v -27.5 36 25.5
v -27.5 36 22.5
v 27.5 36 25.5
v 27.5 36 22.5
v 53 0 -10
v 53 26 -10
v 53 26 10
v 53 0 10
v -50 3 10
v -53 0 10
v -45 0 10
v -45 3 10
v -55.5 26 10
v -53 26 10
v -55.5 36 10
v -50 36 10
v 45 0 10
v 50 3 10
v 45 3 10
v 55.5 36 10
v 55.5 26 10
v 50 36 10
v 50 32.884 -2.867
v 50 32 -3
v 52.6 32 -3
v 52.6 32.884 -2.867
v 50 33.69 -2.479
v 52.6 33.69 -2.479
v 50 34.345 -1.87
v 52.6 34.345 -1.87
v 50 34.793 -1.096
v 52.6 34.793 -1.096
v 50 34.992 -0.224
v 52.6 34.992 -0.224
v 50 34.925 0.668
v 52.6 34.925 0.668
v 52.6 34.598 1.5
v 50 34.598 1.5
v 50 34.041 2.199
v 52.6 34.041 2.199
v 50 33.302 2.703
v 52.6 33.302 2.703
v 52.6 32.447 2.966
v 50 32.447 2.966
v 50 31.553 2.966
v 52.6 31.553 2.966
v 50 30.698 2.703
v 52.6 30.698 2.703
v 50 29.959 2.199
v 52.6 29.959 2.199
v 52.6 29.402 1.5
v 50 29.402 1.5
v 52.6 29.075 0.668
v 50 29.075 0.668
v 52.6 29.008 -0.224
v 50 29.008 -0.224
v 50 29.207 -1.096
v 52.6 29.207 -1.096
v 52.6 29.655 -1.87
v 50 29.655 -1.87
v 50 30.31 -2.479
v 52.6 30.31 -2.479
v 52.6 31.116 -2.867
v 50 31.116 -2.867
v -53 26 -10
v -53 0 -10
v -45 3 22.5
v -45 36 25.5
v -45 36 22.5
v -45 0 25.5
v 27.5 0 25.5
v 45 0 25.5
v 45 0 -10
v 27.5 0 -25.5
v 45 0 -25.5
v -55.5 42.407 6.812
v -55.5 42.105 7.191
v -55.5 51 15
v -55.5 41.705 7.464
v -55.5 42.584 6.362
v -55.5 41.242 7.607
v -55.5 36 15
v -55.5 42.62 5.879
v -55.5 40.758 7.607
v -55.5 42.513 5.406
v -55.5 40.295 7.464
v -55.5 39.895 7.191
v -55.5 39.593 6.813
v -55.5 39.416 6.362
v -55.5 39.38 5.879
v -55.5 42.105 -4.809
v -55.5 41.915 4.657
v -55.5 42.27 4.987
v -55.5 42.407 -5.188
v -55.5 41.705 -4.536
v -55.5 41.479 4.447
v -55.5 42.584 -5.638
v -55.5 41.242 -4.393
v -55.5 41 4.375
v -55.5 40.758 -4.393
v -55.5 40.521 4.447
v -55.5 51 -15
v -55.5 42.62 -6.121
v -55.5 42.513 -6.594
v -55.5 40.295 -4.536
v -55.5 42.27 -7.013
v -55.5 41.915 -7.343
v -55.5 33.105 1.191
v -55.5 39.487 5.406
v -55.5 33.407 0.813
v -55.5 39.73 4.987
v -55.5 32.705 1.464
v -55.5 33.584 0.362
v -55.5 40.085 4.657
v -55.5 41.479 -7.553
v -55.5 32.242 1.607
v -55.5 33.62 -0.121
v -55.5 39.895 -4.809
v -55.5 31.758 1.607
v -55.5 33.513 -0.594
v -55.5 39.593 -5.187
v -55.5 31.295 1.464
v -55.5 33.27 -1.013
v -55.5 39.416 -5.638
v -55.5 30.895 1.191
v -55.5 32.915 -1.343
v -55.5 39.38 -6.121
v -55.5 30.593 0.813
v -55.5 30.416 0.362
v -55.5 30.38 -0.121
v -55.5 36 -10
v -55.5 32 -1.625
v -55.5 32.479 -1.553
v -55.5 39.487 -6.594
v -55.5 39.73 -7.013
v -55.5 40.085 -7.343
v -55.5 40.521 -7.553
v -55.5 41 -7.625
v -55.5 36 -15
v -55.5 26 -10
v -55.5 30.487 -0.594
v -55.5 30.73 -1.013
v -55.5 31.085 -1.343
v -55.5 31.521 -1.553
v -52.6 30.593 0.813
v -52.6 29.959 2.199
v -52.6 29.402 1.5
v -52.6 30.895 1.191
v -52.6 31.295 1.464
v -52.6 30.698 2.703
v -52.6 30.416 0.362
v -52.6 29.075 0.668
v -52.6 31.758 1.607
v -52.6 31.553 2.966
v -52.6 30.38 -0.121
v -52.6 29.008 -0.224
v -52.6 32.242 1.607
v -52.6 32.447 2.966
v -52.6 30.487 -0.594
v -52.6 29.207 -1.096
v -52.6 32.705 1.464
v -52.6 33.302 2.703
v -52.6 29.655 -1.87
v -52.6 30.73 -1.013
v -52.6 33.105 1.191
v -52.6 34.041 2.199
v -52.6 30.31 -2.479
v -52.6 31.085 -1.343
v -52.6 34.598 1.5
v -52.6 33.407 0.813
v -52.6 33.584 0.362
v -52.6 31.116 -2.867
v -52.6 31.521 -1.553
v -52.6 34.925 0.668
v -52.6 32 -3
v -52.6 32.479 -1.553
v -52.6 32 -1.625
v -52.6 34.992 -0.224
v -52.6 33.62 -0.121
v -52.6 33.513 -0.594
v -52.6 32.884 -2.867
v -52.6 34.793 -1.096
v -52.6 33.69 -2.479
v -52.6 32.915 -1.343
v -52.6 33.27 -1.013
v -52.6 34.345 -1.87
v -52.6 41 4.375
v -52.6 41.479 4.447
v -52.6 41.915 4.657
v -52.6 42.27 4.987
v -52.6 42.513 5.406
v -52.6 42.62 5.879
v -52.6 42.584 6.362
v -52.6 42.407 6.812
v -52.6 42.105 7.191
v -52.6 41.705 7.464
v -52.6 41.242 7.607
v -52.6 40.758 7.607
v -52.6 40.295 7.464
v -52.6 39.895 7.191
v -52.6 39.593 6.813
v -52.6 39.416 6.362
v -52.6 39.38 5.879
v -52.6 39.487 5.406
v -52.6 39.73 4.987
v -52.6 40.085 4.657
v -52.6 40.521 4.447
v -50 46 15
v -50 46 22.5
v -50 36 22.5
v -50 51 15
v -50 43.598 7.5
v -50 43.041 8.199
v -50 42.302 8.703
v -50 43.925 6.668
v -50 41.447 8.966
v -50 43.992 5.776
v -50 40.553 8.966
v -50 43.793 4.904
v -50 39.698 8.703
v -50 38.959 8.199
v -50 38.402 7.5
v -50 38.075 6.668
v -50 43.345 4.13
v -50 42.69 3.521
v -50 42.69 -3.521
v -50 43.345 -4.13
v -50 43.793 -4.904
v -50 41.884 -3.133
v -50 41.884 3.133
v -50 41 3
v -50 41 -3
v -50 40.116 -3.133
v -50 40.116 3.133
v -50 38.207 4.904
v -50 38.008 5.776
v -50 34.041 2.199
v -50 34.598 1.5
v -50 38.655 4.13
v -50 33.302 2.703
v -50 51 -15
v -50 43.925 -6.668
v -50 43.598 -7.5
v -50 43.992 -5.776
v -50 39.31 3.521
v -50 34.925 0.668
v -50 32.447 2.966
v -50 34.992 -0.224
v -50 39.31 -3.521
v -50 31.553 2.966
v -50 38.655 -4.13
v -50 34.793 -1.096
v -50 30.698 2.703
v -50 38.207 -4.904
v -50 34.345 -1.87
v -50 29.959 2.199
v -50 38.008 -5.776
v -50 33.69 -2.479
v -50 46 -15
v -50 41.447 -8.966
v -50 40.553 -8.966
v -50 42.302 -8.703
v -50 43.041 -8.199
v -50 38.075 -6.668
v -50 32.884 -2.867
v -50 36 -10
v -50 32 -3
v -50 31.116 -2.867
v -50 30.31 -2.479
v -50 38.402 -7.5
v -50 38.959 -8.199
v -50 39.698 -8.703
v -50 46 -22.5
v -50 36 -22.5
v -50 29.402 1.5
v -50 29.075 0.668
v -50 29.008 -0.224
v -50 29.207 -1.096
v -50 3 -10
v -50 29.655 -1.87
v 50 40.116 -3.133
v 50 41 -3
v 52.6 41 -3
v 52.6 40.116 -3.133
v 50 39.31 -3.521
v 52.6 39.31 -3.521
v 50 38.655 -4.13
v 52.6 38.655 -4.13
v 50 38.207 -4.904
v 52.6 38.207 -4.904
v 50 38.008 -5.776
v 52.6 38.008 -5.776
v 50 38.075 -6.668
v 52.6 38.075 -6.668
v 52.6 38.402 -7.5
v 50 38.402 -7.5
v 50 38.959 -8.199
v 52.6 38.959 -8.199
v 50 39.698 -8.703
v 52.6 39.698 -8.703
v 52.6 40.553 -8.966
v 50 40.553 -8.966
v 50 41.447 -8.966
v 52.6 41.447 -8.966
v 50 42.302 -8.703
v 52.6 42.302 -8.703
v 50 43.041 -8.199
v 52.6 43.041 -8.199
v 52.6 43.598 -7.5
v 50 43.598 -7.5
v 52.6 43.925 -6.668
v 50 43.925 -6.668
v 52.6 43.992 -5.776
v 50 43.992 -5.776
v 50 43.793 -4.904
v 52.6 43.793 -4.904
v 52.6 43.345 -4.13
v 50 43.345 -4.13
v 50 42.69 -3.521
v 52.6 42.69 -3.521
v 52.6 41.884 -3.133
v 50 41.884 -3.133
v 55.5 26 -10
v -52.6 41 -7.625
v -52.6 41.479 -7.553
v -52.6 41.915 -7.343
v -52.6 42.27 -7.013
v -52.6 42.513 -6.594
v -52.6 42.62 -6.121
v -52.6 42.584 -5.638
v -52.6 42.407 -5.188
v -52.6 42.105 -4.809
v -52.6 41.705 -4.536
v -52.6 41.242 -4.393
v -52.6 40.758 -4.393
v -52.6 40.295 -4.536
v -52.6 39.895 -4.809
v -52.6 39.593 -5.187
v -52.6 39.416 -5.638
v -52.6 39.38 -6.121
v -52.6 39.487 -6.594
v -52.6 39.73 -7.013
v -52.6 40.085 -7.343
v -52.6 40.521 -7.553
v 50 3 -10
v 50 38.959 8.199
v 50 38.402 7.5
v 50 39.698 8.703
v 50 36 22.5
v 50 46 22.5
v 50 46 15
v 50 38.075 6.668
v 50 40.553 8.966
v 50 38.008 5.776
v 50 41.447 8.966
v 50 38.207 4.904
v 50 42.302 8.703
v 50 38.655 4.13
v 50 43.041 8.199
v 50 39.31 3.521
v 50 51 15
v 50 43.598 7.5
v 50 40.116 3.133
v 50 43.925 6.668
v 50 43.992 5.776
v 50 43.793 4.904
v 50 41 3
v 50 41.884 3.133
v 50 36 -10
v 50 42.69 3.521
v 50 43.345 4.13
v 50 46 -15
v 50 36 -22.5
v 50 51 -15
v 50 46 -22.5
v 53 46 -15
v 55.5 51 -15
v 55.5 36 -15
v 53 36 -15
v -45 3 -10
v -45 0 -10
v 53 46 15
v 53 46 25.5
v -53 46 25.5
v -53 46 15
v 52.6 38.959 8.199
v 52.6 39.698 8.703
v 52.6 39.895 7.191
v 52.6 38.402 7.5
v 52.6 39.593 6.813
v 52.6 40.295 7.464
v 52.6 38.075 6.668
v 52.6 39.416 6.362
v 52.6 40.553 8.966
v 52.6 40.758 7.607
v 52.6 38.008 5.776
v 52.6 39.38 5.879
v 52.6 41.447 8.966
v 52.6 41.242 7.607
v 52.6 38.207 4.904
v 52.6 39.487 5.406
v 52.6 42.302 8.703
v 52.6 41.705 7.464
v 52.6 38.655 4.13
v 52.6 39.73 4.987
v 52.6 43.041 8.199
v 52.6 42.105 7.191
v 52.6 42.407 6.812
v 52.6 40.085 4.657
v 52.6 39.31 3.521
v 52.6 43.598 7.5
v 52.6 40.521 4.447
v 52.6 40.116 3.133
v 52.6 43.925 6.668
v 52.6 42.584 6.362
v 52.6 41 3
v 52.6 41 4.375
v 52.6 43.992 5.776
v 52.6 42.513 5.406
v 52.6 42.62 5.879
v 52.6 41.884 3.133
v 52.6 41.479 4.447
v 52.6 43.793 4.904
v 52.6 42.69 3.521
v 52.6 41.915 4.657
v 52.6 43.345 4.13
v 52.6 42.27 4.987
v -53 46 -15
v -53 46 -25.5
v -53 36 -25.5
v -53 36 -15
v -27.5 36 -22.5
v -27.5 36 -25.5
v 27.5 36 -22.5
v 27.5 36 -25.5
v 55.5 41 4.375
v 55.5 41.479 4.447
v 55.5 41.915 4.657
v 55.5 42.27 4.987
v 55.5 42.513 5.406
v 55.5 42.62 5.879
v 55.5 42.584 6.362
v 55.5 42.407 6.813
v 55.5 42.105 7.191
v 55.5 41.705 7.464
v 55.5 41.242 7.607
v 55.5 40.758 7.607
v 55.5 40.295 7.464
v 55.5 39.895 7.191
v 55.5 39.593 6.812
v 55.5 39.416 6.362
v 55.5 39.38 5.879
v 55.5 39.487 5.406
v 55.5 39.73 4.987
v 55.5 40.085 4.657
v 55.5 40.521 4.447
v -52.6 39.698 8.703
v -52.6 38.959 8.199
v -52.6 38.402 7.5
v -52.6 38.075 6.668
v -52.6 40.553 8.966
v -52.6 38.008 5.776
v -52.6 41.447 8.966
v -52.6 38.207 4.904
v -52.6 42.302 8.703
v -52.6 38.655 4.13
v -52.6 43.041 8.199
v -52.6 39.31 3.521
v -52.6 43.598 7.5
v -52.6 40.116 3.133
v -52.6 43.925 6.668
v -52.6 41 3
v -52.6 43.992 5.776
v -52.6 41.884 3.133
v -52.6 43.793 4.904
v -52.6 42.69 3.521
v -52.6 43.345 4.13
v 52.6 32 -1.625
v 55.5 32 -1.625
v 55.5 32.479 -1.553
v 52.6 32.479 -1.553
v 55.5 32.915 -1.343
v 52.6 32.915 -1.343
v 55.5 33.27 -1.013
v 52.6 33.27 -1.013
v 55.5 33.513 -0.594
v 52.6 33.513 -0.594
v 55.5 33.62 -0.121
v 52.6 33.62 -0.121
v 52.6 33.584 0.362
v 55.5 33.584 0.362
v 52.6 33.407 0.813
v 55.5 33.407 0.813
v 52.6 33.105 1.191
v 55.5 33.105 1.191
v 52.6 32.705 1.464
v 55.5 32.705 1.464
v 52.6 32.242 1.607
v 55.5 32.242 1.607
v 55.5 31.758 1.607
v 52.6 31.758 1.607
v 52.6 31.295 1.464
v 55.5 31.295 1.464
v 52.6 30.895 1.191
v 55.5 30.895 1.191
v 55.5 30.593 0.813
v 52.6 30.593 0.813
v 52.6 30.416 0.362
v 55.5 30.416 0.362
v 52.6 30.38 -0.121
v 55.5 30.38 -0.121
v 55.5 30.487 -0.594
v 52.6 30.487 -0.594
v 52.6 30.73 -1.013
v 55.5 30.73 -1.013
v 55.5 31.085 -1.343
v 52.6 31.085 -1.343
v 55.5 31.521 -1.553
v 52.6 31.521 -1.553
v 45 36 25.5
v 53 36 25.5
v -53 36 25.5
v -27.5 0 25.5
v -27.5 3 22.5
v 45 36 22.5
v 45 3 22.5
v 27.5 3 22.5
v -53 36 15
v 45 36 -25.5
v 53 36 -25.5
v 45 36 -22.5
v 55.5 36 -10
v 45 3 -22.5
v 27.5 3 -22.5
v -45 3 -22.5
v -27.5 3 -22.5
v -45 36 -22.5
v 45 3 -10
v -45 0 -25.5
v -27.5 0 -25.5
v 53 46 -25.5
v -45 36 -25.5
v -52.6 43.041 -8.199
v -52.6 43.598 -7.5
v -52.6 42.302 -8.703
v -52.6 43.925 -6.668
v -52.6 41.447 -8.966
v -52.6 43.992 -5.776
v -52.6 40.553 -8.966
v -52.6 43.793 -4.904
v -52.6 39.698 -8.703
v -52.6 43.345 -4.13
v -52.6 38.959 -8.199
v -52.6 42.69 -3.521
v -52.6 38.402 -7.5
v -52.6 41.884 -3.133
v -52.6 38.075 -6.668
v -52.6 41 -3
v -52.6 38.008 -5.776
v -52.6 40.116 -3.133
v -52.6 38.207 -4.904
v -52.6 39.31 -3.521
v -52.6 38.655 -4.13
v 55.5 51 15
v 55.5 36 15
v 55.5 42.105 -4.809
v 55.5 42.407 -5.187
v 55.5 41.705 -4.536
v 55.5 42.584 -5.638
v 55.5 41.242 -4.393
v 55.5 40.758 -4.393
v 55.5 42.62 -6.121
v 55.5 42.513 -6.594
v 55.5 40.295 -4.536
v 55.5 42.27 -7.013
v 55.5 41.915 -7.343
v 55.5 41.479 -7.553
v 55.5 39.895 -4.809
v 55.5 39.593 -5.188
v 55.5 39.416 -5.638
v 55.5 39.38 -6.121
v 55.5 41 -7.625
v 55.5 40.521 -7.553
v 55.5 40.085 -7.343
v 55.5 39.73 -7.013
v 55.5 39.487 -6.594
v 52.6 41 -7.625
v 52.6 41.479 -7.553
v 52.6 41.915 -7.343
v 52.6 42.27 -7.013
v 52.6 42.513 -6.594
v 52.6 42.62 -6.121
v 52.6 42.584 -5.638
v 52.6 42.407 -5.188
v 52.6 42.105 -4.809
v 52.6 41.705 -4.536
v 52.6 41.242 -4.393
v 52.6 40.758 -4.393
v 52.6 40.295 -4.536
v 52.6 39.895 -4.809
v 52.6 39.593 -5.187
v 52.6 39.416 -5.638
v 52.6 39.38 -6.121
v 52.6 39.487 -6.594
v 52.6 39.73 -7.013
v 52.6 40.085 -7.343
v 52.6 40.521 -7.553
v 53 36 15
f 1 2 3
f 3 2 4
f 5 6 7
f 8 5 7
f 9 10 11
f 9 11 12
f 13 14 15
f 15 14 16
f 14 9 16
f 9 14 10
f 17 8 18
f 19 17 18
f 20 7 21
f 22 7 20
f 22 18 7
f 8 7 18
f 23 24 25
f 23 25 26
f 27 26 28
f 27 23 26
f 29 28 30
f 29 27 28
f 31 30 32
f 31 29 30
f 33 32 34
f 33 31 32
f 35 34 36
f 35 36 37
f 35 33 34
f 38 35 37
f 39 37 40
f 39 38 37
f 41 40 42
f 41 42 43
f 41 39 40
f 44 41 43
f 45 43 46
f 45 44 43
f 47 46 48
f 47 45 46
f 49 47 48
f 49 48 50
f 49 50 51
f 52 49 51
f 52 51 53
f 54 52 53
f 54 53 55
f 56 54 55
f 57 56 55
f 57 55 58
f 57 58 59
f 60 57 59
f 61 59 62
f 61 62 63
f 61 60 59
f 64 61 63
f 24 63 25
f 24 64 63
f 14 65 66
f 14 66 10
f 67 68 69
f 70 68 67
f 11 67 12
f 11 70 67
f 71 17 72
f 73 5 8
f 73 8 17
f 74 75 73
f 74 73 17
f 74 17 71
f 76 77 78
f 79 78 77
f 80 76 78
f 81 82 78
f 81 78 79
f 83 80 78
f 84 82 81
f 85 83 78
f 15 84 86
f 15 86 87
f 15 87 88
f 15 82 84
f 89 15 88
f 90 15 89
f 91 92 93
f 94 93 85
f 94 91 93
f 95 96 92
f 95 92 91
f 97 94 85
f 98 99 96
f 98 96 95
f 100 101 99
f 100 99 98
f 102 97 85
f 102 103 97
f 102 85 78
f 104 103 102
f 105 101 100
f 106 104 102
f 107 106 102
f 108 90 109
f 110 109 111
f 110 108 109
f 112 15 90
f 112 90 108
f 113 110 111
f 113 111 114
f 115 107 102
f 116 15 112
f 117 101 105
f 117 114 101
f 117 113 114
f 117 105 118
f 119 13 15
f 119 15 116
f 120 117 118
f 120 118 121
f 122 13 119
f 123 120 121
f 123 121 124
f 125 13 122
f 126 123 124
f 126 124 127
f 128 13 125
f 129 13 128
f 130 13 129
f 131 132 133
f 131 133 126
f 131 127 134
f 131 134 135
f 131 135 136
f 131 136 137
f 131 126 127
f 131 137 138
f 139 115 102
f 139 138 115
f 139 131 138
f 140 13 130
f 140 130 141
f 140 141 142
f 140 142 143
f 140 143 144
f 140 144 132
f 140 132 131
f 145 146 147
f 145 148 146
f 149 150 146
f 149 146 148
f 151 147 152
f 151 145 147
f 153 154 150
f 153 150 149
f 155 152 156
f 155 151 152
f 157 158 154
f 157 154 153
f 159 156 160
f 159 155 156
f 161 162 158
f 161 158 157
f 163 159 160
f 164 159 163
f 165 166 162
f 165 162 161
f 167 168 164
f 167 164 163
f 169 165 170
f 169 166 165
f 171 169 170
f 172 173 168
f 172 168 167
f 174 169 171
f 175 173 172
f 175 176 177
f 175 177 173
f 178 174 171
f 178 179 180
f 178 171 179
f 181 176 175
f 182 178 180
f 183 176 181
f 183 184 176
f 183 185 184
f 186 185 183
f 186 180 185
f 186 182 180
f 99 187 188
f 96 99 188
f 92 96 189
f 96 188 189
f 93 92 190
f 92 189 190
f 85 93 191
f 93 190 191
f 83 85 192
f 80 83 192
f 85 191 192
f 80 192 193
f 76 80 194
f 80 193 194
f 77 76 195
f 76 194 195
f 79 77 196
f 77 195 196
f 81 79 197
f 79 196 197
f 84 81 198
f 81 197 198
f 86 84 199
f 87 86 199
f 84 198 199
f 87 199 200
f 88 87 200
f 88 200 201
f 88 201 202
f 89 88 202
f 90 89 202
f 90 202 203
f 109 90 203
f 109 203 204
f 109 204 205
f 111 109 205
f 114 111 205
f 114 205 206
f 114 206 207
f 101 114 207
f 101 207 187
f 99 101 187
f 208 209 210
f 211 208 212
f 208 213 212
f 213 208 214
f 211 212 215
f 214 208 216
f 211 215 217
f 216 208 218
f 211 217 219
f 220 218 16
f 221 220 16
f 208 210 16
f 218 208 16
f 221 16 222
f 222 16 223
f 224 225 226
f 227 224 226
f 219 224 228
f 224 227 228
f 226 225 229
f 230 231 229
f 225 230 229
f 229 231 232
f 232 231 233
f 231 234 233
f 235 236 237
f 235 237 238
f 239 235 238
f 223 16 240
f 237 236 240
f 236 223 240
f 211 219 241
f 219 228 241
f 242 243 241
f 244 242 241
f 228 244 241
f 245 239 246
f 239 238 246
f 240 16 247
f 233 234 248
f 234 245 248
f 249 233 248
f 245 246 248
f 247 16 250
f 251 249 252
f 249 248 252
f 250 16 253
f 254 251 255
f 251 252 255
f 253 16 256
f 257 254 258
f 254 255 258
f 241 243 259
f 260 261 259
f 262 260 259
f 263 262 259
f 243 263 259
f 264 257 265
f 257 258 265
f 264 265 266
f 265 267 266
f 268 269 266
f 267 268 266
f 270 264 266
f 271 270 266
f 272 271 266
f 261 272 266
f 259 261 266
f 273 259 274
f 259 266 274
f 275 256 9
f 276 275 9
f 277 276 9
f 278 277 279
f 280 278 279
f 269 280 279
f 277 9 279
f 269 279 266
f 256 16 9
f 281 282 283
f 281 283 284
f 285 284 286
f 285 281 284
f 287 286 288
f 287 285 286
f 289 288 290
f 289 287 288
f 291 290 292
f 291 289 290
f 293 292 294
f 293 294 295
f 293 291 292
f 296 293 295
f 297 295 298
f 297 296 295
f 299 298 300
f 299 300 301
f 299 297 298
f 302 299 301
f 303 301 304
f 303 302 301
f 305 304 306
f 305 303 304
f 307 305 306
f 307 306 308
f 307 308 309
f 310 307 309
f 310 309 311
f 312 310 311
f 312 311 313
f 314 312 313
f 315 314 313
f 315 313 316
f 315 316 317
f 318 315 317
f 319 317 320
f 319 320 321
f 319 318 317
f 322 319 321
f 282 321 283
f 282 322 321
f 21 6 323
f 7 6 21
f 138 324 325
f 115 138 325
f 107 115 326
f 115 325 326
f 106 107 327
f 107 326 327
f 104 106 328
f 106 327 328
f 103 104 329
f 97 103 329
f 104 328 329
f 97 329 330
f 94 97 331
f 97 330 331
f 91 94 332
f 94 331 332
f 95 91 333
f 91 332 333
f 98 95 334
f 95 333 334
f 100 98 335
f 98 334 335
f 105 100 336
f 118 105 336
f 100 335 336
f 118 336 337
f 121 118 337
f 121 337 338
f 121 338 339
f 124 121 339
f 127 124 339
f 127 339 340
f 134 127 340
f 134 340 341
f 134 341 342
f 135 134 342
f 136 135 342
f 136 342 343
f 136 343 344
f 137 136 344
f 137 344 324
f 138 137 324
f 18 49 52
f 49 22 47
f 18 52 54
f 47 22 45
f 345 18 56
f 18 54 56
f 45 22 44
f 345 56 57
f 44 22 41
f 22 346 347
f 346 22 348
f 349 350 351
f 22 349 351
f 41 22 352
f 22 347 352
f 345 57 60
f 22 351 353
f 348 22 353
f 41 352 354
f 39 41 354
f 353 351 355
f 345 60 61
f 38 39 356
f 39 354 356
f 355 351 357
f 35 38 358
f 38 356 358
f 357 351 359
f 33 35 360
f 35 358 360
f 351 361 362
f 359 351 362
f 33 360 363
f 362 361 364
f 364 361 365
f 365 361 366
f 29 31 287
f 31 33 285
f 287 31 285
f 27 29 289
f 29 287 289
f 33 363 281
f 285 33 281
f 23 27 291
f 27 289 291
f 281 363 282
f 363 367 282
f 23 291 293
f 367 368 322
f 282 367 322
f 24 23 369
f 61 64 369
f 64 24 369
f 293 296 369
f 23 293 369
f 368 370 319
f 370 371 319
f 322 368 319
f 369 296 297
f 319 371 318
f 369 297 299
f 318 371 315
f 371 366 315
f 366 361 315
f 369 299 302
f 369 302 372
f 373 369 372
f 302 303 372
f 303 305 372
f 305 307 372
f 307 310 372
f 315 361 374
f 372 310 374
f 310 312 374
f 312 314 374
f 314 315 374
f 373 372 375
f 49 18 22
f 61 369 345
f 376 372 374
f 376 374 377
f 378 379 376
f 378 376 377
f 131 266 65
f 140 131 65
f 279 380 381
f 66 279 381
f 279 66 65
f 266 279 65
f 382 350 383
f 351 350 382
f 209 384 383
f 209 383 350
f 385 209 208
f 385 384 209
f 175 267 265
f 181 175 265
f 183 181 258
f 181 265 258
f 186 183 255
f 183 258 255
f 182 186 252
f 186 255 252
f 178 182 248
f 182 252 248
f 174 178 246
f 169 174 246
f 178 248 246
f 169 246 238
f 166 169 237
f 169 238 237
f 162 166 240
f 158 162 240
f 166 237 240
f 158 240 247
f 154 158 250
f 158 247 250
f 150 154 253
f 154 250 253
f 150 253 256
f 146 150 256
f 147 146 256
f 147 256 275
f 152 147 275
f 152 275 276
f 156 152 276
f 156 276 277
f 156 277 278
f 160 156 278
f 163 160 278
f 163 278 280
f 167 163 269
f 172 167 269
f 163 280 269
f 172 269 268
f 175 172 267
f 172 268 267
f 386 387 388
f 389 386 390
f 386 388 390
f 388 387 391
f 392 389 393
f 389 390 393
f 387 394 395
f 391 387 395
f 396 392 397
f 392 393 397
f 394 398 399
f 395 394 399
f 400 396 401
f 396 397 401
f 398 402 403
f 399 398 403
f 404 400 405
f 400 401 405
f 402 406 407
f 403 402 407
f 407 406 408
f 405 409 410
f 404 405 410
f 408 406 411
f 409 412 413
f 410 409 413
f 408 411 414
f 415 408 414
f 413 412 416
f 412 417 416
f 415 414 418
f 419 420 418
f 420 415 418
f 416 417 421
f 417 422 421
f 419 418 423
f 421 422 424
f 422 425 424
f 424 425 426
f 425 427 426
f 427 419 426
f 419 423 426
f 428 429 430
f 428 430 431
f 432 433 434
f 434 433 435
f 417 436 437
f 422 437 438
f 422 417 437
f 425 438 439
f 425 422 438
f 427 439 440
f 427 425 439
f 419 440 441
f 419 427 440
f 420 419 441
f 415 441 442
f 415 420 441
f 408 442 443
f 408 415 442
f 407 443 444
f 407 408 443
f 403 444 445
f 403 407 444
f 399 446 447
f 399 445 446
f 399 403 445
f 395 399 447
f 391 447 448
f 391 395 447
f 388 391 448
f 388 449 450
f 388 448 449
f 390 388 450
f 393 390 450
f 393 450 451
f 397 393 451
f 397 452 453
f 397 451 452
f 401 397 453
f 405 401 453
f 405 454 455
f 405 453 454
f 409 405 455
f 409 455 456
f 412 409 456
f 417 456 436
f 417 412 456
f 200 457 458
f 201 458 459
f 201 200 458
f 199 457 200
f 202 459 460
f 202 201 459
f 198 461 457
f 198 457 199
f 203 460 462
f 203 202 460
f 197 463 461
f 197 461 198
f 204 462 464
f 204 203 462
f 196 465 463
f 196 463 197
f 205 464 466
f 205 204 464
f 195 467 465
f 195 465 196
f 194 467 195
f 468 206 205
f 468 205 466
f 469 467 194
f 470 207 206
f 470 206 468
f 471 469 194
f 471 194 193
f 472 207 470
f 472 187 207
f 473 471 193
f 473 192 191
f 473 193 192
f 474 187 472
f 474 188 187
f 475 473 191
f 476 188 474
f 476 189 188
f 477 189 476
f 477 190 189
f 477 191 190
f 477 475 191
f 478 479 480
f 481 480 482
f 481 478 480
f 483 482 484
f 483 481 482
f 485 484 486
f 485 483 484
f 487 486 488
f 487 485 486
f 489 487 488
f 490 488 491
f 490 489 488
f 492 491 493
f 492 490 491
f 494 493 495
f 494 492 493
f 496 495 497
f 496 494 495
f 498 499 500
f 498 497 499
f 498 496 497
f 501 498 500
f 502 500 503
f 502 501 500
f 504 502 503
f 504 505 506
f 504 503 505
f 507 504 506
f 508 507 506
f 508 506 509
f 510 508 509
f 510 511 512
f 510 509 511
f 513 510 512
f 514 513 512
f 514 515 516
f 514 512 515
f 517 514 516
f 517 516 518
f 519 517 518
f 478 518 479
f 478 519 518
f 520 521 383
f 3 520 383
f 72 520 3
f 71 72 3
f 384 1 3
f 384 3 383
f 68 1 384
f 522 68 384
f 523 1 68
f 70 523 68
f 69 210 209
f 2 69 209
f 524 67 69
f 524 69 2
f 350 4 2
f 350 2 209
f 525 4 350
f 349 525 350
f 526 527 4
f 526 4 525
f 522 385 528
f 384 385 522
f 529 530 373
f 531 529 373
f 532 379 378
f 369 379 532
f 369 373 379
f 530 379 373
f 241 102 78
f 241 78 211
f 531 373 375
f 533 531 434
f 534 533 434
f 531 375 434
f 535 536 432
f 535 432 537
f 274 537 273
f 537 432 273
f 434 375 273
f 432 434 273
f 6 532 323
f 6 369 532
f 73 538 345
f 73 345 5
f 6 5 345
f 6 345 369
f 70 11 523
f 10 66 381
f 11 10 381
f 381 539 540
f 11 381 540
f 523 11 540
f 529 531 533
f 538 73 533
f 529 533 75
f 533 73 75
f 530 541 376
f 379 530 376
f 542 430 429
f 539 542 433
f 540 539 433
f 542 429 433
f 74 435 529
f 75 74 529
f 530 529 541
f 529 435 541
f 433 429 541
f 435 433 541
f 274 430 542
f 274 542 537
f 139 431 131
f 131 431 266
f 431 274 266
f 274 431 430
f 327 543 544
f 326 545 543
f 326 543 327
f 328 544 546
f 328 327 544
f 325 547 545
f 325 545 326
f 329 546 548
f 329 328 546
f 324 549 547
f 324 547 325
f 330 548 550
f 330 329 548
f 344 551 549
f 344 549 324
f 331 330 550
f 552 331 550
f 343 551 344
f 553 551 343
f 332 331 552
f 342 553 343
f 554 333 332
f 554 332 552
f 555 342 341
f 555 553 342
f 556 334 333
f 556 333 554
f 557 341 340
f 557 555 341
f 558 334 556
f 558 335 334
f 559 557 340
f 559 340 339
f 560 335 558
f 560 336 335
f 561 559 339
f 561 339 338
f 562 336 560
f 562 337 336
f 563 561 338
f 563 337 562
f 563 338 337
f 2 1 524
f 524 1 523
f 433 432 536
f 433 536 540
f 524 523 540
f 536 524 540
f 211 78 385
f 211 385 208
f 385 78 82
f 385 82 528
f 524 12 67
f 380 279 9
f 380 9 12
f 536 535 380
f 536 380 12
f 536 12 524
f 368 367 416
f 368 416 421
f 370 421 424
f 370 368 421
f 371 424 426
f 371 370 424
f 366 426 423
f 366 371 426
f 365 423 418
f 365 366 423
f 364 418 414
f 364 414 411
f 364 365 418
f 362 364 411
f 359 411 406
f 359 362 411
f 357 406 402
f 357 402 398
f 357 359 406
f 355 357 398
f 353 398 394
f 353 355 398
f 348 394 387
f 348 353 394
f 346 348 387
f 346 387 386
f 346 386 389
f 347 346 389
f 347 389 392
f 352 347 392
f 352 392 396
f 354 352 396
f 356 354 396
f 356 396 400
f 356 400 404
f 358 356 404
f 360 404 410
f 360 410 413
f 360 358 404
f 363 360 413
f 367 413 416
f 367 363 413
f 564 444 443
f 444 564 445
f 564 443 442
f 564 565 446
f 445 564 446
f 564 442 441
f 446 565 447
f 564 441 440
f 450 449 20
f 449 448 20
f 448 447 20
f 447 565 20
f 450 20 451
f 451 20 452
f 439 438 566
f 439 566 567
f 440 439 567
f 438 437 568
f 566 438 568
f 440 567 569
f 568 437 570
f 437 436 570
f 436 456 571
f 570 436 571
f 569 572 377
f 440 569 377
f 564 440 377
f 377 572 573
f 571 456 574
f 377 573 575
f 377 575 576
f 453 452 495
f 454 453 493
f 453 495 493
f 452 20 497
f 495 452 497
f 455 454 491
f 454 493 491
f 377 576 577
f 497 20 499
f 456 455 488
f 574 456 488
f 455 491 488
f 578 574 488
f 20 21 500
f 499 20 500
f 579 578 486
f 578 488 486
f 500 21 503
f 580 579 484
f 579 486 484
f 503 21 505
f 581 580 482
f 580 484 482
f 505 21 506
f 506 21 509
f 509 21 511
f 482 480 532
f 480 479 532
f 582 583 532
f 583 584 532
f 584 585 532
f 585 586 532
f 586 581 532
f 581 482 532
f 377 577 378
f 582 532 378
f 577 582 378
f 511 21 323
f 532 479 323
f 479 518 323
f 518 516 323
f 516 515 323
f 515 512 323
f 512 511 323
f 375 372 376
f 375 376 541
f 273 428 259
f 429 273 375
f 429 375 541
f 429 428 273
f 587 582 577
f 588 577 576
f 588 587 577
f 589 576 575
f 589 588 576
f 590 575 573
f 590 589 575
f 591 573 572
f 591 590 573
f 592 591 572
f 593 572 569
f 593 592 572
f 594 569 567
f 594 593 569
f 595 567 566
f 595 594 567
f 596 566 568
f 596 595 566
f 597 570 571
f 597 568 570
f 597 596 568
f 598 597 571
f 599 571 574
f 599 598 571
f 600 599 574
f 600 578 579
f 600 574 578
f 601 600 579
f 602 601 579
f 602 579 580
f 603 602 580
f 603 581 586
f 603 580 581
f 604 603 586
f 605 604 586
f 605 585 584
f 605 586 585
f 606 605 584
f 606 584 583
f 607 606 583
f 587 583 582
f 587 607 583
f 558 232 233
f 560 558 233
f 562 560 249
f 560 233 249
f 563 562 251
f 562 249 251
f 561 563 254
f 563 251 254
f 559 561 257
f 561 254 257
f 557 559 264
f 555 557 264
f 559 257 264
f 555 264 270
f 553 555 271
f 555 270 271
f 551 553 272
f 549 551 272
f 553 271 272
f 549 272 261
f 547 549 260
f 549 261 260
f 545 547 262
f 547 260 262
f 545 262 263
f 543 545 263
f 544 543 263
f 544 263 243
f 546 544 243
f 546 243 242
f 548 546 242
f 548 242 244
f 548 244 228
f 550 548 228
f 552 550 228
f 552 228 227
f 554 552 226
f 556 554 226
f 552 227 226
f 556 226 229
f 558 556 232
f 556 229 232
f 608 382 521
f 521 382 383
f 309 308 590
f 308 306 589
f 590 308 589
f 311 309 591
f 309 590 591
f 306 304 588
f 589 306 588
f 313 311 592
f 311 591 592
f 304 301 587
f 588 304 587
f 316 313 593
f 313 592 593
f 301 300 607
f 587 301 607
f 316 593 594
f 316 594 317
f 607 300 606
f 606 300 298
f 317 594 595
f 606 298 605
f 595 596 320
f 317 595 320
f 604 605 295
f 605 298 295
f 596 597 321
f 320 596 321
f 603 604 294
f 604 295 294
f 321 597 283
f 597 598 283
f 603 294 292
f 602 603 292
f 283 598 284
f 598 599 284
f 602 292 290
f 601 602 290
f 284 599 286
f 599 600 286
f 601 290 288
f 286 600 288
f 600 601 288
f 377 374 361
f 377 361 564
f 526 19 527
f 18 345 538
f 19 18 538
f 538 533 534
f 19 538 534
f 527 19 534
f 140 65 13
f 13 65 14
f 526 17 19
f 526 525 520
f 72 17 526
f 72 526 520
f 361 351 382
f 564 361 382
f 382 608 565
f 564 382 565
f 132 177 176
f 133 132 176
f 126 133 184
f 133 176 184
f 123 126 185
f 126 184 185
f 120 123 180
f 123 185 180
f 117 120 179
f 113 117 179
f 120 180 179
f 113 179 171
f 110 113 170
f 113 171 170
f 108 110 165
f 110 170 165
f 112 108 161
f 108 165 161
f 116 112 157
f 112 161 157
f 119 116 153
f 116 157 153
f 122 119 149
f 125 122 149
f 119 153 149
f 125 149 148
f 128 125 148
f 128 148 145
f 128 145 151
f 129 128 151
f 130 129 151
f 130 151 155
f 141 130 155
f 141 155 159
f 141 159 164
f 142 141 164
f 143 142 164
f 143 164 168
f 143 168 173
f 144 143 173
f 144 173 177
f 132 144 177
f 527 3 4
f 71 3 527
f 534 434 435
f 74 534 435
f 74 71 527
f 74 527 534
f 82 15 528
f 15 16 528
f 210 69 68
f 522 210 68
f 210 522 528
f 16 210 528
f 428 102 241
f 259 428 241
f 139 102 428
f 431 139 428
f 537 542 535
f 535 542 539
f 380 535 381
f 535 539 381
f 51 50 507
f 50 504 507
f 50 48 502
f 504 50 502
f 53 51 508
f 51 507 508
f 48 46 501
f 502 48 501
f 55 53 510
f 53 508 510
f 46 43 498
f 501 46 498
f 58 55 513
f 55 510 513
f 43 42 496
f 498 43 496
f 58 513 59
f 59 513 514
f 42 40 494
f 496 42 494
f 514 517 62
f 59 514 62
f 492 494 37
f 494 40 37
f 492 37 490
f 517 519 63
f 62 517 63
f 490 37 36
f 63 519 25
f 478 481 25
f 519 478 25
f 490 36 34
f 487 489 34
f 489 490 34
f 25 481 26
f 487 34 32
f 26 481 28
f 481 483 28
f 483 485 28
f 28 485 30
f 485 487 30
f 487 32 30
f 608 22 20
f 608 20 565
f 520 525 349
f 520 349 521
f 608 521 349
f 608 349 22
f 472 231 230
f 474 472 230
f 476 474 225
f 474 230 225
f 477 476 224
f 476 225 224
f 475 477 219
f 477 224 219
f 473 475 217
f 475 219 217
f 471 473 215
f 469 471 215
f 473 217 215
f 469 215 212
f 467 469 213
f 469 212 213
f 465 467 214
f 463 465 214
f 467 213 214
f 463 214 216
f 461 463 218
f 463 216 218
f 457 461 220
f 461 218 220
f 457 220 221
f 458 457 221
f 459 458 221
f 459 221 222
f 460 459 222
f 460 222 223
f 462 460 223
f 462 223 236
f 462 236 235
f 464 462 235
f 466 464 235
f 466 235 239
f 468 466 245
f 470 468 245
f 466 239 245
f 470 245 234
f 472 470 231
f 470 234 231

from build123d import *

# Parameters (mm, degrees)
EXTRUDE_1_DEPTH     = 3
EXTRUDE_1_2_DEPTH   = 3
SKETCH_2_W          = 17.5
SKETCH_2_H          = 3
SKETCH_2_W_2        = 3
SKETCH_2_H_2        = 20
EXTRUDE_2_DEPTH     = 43
SKETCH_3_W          = 55
SKETCH_3_H          = 3
EXTRUDE_3_DEPTH     = 10
EXTRUDE_4_DEPTH     = 2.5
SKETCH_5_R          = 3
CUT_EXTRUDE_1_DEPTH = 2.6
SKETCH_7_R          = 1.625
CUT_EXTRUDE_2_DEPTH = 118.972920622
SKETCH_8_W          = 5.5
SKETCH_8_H          = 30
EXTRUDE_5_DEPTH     = 5


with BuildPart() as part:
    # Эскиз1 → Бобышка-Вытянуть1 (new body)
    with BuildSketch(Plane(origin=(0, 0, 0), x_dir=(1, 0, 0), z_dir=(0, 1, 0))):
        Polygon((27.5, 25.5), (45, 25.5), (45, 10), (53, 10), (53, -10), (45, -10), (45, -25.5), (27.5, -25.5), align=None)
    extrude(amount=EXTRUDE_1_DEPTH)



with BuildPart() as body_2:
    # Эскиз1 → Extrude 1 2 (new body)
    with BuildSketch(Plane(origin=(0, 0, 0), x_dir=(1, 0, 0), z_dir=(0, 1, 0))):
        Polygon((-27.5, -25.5), (-27.5, 25.5), (-45, 25.5), (-45, 10), (-53, 10), (-53, -10), (-45, -10), (-45, -25.5), align=None)
    extrude(amount=EXTRUDE_1_2_DEPTH)


with BuildPart() as part_1:
    add(part.part)

    add(body_2.part)  # Бобышка-Вытянуть2 merges body 2
    # Эскиз2 → Бобышка-Вытянуть2 (add)
    with BuildSketch(Plane(origin=(0, 3, 0), x_dir=(1, 0, 0), z_dir=(0, 1, 0))):
        with Locations((36.25, 24)):
            Rectangle(SKETCH_2_W, SKETCH_2_H)
        with Locations((51.5, 0)):
            Rectangle(SKETCH_2_W_2, SKETCH_2_H_2)
        with Locations((36.25, -24)):
            Rectangle(SKETCH_2_W, SKETCH_2_H)
        with Locations((-36.25, -24)):
            Rectangle(SKETCH_2_W, SKETCH_2_H)
        with Locations((-51.5, 0)):
            Rectangle(SKETCH_2_W_2, SKETCH_2_H_2)
        with Locations((-36.25, 24)):
            Rectangle(SKETCH_2_W, SKETCH_2_H)
    extrude(amount=EXTRUDE_2_DEPTH)

    # Эскиз3 → Бобышка-Вытянуть3 (add)
    with BuildSketch(Plane(origin=(0, 46, 0), x_dir=(1, 0, 0), z_dir=(0, 1, 0))):
        Polygon((45, 25.5), (53, 25.5), (53, 10), (50, 10), (50, 22.5), (45, 22.5), align=None)
        with Locations((0, 24)):
            Rectangle(SKETCH_3_W, SKETCH_3_H)
        Polygon((-45, 22.5), (-45, 25.5), (-53, 25.5), (-53, 10), (-50, 10), (-50, 22.5), align=None)
        Polygon((-45, -25.5), (-53, -25.5), (-53, -10), (-50, -10), (-50, -22.5), (-45, -22.5), align=None)
        Polygon((45, -22.5), (45, -25.5), (53, -25.5), (53, -10), (50, -10), (50, -22.5), align=None)
        with Locations((0, -24)):
            Rectangle(SKETCH_3_W, SKETCH_3_H)
    extrude(amount=-EXTRUDE_3_DEPTH)

    # Эскиз4 → Бобышка-Вытянуть4 (add)
    with BuildSketch(Plane.ZY.offset(53)):
        Polygon((-10, 26), (10, 26), (10, 36), (15, 36), (15, 46), (-15, 46), (-15, 36), (-10, 36), align=None)
    extrude_4 = extrude(amount=EXTRUDE_4_DEPTH)

    # Эскиз5 → Вырез-Вытянуть1 (cut)
    with BuildSketch(Plane(origin=(-50, 0, 0), x_dir=(0, 0, -1), z_dir=(1, 0, 0))):
        with Locations((-6, 41)):
            Circle(SKETCH_5_R)
        with Locations((0, 32)):
            Circle(SKETCH_5_R)
        with Locations(Location((6, 41, 0), (0, 0, 180))):
            Circle(SKETCH_5_R)
    cut_extrude_1 = extrude(amount=-CUT_EXTRUDE_1_DEPTH, mode=Mode.SUBTRACT)

    # Эскиз7 → Вырез-Вытянуть2 (cut, through all)
    with BuildSketch(Plane(origin=(-52.6, 0, 0), x_dir=(0, 0, -1), z_dir=(1, 0, 0))):
        with Locations((-6, 41)):
            Circle(SKETCH_7_R)
        with Locations((6, 41)):
            Circle(SKETCH_7_R)
        with Locations((0, 32)):
            Circle(SKETCH_7_R)
    cut_extrude_2 = extrude(amount=-CUT_EXTRUDE_2_DEPTH, mode=Mode.SUBTRACT)

    # Зеркальное отражение2: Бобышка-Вытянуть4, Вырез-Вытянуть1, Вырез-Вытянуть2 across plane
    add(extrude_4.mirror(Plane(origin=(0, 0, 0), x_dir=(0, 0, 1), z_dir=(1, 0, 0))))
    add(cut_extrude_1.mirror(Plane(origin=(0, 0, 0), x_dir=(0, 0, 1), z_dir=(1, 0, 0))), mode=Mode.SUBTRACT)
    add(cut_extrude_2.mirror(Plane(origin=(0, 0, 0), x_dir=(0, 0, 1), z_dir=(1, 0, 0))), mode=Mode.SUBTRACT)

    # Эскиз8 → Бобышка-Вытянуть5 (add)
    with BuildSketch(Plane(origin=(0, 46, 0), x_dir=(1, 0, 0), z_dir=(0, 1, 0))):
        with Locations((-52.75, 0)):
            Rectangle(SKETCH_8_W, SKETCH_8_H)
        with Locations((52.75, 0)):
            Rectangle(SKETCH_8_W, SKETCH_8_H)
    extrude(amount=EXTRUDE_5_DEPTH)


solid = part_1.part
